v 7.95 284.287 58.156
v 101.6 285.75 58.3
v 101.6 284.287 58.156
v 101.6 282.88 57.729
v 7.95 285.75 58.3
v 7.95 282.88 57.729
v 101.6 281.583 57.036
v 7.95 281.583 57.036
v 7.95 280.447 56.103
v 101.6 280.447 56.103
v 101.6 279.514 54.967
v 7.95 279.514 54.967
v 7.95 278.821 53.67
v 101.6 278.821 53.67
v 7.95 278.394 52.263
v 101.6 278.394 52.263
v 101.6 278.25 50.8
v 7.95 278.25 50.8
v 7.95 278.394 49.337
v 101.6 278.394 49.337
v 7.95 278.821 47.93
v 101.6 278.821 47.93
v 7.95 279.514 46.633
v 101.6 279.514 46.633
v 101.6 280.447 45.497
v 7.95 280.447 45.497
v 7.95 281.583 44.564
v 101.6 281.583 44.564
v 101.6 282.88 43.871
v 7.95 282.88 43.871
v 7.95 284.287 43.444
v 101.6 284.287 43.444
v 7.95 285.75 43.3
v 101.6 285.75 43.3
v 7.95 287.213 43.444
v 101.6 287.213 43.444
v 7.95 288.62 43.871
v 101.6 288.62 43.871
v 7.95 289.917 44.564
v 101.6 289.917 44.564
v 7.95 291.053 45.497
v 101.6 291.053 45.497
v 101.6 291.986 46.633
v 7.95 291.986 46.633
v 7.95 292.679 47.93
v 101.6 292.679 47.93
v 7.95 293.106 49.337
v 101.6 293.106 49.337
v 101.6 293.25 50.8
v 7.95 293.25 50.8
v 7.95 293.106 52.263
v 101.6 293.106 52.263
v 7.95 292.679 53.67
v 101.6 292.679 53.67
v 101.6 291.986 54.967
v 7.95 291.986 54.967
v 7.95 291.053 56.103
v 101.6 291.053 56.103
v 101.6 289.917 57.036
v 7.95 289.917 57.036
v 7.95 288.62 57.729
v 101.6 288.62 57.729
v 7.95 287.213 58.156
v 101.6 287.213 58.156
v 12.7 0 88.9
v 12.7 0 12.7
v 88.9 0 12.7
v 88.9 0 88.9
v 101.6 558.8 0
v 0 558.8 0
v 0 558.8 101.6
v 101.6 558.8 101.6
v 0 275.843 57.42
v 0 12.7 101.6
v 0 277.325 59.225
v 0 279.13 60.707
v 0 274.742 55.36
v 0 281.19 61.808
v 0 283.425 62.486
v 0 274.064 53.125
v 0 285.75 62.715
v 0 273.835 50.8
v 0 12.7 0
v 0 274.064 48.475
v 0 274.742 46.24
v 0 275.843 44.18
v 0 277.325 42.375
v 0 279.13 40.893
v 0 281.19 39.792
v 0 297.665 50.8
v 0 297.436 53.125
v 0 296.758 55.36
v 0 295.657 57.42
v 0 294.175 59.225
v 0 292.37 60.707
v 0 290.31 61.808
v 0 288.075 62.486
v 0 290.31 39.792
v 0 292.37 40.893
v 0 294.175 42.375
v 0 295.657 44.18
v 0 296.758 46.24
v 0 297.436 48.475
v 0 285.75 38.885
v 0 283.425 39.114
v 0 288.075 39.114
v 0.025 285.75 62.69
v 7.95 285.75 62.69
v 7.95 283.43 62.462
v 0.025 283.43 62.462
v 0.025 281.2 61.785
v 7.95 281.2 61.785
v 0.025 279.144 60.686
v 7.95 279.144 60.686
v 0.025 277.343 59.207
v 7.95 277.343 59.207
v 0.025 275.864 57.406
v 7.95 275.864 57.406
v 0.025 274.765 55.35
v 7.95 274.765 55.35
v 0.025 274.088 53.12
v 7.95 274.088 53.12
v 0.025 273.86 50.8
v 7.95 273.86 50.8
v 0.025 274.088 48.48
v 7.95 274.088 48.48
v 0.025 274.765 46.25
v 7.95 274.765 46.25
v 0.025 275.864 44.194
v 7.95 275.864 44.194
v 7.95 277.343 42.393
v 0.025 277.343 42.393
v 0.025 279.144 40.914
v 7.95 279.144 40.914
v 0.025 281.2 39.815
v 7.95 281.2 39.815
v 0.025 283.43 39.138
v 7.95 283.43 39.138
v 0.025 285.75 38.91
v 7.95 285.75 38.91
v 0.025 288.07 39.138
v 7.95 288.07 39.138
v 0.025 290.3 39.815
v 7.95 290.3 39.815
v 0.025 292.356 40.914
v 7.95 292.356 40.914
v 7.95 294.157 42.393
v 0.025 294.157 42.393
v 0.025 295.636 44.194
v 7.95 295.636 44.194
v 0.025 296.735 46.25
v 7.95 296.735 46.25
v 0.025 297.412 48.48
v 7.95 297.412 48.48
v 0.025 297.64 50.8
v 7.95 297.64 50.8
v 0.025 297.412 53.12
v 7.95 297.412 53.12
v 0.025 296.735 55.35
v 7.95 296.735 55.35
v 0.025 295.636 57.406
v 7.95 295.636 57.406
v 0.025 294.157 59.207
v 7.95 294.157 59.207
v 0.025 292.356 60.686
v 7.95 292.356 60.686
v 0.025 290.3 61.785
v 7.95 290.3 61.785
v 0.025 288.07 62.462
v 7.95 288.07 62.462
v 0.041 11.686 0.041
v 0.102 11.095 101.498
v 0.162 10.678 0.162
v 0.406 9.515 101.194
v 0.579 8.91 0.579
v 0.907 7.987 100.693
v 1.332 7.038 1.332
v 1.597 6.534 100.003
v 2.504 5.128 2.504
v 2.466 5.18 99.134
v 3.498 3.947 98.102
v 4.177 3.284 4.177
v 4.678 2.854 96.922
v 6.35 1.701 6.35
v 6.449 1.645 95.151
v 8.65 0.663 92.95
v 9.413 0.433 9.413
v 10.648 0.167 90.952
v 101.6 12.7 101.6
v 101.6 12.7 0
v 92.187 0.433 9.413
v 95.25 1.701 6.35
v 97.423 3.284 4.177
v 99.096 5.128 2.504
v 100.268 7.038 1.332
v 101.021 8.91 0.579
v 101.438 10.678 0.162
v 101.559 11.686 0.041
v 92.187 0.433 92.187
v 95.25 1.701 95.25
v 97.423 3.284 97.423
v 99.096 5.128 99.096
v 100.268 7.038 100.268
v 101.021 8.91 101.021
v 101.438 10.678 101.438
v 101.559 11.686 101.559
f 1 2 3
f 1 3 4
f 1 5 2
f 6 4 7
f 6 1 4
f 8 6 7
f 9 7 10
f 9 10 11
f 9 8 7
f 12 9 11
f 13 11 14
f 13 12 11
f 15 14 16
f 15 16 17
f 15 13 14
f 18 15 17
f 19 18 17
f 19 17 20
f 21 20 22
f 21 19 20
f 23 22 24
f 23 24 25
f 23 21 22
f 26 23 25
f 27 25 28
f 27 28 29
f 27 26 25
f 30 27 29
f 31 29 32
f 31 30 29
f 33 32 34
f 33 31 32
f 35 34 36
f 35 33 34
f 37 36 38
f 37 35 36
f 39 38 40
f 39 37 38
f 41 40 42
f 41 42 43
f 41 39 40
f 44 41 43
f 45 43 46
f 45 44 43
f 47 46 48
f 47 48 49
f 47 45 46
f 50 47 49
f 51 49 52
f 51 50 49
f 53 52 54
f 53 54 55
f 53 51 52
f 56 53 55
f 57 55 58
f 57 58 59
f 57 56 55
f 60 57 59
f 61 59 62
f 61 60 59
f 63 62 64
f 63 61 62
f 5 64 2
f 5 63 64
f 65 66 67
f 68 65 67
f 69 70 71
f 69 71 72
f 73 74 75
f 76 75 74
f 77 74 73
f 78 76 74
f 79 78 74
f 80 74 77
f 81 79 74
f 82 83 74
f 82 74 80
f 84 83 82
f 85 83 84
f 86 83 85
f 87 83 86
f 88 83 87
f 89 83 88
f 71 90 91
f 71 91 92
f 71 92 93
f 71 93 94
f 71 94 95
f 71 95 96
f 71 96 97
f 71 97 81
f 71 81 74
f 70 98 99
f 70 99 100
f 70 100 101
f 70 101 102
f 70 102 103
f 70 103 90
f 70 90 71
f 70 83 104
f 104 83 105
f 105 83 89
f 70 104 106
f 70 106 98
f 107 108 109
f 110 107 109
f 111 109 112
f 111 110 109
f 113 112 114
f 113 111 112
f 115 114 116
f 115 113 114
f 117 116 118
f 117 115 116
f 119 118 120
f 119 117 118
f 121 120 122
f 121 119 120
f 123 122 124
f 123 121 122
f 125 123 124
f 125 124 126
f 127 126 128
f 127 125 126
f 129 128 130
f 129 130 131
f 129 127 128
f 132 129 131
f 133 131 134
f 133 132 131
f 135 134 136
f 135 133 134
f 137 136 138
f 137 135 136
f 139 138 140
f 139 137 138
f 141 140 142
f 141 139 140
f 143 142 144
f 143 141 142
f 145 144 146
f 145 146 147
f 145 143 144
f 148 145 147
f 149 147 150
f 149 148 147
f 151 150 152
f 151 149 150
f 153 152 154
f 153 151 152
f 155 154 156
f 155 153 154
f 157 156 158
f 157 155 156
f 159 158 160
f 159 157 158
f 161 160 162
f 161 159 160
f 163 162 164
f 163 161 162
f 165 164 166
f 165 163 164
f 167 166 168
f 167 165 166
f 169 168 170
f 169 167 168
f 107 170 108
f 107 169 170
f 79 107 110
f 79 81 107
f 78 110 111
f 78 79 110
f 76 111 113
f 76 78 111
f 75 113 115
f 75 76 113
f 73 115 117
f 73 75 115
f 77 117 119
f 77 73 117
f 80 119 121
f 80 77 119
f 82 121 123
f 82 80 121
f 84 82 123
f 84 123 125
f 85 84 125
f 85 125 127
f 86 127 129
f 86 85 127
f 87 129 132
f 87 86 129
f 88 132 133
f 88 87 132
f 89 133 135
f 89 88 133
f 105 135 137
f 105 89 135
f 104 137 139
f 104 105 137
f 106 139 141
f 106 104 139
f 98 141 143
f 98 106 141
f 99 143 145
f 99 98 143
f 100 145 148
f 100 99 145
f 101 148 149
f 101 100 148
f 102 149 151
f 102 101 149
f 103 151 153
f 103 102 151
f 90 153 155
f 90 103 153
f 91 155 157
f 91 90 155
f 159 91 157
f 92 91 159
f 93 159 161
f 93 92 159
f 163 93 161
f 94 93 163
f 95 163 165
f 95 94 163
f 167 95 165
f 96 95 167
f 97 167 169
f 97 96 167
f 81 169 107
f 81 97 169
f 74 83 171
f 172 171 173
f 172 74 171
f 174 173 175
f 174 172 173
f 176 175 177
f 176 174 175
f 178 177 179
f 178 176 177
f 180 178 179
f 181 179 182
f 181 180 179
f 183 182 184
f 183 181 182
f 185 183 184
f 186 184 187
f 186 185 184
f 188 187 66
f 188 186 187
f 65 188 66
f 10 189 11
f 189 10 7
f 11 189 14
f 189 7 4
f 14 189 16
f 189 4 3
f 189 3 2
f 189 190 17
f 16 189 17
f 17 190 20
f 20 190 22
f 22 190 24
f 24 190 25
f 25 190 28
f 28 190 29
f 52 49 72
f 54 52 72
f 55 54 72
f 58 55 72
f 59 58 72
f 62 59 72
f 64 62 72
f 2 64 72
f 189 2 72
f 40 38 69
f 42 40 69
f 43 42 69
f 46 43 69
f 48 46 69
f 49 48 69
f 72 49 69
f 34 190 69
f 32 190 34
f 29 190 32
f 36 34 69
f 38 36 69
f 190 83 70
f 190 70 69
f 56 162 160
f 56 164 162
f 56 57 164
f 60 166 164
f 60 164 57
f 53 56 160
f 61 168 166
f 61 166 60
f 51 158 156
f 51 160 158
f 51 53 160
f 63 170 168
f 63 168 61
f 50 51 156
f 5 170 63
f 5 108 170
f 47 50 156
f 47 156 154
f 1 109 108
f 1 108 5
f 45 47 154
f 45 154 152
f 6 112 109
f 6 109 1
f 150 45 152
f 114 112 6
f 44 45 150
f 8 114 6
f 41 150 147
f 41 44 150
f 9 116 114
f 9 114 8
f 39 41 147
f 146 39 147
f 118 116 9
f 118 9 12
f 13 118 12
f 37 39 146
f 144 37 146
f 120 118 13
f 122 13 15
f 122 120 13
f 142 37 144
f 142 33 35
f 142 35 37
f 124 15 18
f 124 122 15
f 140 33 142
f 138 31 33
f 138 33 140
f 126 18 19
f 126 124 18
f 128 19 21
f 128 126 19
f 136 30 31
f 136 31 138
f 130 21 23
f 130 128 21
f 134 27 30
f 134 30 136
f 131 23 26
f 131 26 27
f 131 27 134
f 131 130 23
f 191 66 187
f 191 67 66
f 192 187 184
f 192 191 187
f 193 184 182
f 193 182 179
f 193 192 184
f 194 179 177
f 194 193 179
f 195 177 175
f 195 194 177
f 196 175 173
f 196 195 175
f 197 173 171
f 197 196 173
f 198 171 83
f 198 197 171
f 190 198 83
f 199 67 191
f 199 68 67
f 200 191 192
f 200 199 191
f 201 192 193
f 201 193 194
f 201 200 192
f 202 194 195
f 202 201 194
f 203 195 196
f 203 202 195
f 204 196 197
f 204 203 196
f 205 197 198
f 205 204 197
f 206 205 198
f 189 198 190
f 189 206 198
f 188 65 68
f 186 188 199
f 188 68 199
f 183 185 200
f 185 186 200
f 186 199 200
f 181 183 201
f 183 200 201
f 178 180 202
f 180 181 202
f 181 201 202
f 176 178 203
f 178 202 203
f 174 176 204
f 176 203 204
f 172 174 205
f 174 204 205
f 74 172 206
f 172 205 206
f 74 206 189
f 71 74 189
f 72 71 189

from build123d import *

# Parameters (mm, degrees)
SKETCH1_W           = 101.6
SKETCH1_H           = 558.8
BOSS_EXTRUDE1_DEPTH = 101.6
FILLET2_R           = 12.7


with BuildPart() as part:
    # Sketch1 → Boss-Extrude1 (new body)
    with BuildSketch(Plane.XY):
        with Locations((50.8, 279.4)):
            Rectangle(SKETCH1_W, SKETCH1_H)
    extrude(amount=BOSS_EXTRUDE1_DEPTH)

    # Fillet2
    fillet2_edges = [part.edges().sort_by_distance(p)[0] for p in [
        (50.8, 0, 0),
        (101.6, 0, 50.8),
        (0, 0, 50.8),
        (50.8, 0, 101.6),
    ]]
    fillet(fillet2_edges, radius=FILLET2_R)

    # Sketch8 → CBORE for M12 Hex Head Bolt1 (revolve, cut)
    with BuildSketch(Plane(origin=(0, 285.75, 50.8), x_dir=(0, 0, 1), z_dir=(0, 1, 0))):
        Polygon((0, 0), (0, 101.6), (7.5, 101.6), (7.5, 7.95), (11.89, 7.95), (11.89, 0.025), (11.915, 0), align=None)
    revolve(axis=Axis((-6.35, 285.75, 50.8), (1, 0, 0)), mode=Mode.SUBTRACT)


solid = part.part
